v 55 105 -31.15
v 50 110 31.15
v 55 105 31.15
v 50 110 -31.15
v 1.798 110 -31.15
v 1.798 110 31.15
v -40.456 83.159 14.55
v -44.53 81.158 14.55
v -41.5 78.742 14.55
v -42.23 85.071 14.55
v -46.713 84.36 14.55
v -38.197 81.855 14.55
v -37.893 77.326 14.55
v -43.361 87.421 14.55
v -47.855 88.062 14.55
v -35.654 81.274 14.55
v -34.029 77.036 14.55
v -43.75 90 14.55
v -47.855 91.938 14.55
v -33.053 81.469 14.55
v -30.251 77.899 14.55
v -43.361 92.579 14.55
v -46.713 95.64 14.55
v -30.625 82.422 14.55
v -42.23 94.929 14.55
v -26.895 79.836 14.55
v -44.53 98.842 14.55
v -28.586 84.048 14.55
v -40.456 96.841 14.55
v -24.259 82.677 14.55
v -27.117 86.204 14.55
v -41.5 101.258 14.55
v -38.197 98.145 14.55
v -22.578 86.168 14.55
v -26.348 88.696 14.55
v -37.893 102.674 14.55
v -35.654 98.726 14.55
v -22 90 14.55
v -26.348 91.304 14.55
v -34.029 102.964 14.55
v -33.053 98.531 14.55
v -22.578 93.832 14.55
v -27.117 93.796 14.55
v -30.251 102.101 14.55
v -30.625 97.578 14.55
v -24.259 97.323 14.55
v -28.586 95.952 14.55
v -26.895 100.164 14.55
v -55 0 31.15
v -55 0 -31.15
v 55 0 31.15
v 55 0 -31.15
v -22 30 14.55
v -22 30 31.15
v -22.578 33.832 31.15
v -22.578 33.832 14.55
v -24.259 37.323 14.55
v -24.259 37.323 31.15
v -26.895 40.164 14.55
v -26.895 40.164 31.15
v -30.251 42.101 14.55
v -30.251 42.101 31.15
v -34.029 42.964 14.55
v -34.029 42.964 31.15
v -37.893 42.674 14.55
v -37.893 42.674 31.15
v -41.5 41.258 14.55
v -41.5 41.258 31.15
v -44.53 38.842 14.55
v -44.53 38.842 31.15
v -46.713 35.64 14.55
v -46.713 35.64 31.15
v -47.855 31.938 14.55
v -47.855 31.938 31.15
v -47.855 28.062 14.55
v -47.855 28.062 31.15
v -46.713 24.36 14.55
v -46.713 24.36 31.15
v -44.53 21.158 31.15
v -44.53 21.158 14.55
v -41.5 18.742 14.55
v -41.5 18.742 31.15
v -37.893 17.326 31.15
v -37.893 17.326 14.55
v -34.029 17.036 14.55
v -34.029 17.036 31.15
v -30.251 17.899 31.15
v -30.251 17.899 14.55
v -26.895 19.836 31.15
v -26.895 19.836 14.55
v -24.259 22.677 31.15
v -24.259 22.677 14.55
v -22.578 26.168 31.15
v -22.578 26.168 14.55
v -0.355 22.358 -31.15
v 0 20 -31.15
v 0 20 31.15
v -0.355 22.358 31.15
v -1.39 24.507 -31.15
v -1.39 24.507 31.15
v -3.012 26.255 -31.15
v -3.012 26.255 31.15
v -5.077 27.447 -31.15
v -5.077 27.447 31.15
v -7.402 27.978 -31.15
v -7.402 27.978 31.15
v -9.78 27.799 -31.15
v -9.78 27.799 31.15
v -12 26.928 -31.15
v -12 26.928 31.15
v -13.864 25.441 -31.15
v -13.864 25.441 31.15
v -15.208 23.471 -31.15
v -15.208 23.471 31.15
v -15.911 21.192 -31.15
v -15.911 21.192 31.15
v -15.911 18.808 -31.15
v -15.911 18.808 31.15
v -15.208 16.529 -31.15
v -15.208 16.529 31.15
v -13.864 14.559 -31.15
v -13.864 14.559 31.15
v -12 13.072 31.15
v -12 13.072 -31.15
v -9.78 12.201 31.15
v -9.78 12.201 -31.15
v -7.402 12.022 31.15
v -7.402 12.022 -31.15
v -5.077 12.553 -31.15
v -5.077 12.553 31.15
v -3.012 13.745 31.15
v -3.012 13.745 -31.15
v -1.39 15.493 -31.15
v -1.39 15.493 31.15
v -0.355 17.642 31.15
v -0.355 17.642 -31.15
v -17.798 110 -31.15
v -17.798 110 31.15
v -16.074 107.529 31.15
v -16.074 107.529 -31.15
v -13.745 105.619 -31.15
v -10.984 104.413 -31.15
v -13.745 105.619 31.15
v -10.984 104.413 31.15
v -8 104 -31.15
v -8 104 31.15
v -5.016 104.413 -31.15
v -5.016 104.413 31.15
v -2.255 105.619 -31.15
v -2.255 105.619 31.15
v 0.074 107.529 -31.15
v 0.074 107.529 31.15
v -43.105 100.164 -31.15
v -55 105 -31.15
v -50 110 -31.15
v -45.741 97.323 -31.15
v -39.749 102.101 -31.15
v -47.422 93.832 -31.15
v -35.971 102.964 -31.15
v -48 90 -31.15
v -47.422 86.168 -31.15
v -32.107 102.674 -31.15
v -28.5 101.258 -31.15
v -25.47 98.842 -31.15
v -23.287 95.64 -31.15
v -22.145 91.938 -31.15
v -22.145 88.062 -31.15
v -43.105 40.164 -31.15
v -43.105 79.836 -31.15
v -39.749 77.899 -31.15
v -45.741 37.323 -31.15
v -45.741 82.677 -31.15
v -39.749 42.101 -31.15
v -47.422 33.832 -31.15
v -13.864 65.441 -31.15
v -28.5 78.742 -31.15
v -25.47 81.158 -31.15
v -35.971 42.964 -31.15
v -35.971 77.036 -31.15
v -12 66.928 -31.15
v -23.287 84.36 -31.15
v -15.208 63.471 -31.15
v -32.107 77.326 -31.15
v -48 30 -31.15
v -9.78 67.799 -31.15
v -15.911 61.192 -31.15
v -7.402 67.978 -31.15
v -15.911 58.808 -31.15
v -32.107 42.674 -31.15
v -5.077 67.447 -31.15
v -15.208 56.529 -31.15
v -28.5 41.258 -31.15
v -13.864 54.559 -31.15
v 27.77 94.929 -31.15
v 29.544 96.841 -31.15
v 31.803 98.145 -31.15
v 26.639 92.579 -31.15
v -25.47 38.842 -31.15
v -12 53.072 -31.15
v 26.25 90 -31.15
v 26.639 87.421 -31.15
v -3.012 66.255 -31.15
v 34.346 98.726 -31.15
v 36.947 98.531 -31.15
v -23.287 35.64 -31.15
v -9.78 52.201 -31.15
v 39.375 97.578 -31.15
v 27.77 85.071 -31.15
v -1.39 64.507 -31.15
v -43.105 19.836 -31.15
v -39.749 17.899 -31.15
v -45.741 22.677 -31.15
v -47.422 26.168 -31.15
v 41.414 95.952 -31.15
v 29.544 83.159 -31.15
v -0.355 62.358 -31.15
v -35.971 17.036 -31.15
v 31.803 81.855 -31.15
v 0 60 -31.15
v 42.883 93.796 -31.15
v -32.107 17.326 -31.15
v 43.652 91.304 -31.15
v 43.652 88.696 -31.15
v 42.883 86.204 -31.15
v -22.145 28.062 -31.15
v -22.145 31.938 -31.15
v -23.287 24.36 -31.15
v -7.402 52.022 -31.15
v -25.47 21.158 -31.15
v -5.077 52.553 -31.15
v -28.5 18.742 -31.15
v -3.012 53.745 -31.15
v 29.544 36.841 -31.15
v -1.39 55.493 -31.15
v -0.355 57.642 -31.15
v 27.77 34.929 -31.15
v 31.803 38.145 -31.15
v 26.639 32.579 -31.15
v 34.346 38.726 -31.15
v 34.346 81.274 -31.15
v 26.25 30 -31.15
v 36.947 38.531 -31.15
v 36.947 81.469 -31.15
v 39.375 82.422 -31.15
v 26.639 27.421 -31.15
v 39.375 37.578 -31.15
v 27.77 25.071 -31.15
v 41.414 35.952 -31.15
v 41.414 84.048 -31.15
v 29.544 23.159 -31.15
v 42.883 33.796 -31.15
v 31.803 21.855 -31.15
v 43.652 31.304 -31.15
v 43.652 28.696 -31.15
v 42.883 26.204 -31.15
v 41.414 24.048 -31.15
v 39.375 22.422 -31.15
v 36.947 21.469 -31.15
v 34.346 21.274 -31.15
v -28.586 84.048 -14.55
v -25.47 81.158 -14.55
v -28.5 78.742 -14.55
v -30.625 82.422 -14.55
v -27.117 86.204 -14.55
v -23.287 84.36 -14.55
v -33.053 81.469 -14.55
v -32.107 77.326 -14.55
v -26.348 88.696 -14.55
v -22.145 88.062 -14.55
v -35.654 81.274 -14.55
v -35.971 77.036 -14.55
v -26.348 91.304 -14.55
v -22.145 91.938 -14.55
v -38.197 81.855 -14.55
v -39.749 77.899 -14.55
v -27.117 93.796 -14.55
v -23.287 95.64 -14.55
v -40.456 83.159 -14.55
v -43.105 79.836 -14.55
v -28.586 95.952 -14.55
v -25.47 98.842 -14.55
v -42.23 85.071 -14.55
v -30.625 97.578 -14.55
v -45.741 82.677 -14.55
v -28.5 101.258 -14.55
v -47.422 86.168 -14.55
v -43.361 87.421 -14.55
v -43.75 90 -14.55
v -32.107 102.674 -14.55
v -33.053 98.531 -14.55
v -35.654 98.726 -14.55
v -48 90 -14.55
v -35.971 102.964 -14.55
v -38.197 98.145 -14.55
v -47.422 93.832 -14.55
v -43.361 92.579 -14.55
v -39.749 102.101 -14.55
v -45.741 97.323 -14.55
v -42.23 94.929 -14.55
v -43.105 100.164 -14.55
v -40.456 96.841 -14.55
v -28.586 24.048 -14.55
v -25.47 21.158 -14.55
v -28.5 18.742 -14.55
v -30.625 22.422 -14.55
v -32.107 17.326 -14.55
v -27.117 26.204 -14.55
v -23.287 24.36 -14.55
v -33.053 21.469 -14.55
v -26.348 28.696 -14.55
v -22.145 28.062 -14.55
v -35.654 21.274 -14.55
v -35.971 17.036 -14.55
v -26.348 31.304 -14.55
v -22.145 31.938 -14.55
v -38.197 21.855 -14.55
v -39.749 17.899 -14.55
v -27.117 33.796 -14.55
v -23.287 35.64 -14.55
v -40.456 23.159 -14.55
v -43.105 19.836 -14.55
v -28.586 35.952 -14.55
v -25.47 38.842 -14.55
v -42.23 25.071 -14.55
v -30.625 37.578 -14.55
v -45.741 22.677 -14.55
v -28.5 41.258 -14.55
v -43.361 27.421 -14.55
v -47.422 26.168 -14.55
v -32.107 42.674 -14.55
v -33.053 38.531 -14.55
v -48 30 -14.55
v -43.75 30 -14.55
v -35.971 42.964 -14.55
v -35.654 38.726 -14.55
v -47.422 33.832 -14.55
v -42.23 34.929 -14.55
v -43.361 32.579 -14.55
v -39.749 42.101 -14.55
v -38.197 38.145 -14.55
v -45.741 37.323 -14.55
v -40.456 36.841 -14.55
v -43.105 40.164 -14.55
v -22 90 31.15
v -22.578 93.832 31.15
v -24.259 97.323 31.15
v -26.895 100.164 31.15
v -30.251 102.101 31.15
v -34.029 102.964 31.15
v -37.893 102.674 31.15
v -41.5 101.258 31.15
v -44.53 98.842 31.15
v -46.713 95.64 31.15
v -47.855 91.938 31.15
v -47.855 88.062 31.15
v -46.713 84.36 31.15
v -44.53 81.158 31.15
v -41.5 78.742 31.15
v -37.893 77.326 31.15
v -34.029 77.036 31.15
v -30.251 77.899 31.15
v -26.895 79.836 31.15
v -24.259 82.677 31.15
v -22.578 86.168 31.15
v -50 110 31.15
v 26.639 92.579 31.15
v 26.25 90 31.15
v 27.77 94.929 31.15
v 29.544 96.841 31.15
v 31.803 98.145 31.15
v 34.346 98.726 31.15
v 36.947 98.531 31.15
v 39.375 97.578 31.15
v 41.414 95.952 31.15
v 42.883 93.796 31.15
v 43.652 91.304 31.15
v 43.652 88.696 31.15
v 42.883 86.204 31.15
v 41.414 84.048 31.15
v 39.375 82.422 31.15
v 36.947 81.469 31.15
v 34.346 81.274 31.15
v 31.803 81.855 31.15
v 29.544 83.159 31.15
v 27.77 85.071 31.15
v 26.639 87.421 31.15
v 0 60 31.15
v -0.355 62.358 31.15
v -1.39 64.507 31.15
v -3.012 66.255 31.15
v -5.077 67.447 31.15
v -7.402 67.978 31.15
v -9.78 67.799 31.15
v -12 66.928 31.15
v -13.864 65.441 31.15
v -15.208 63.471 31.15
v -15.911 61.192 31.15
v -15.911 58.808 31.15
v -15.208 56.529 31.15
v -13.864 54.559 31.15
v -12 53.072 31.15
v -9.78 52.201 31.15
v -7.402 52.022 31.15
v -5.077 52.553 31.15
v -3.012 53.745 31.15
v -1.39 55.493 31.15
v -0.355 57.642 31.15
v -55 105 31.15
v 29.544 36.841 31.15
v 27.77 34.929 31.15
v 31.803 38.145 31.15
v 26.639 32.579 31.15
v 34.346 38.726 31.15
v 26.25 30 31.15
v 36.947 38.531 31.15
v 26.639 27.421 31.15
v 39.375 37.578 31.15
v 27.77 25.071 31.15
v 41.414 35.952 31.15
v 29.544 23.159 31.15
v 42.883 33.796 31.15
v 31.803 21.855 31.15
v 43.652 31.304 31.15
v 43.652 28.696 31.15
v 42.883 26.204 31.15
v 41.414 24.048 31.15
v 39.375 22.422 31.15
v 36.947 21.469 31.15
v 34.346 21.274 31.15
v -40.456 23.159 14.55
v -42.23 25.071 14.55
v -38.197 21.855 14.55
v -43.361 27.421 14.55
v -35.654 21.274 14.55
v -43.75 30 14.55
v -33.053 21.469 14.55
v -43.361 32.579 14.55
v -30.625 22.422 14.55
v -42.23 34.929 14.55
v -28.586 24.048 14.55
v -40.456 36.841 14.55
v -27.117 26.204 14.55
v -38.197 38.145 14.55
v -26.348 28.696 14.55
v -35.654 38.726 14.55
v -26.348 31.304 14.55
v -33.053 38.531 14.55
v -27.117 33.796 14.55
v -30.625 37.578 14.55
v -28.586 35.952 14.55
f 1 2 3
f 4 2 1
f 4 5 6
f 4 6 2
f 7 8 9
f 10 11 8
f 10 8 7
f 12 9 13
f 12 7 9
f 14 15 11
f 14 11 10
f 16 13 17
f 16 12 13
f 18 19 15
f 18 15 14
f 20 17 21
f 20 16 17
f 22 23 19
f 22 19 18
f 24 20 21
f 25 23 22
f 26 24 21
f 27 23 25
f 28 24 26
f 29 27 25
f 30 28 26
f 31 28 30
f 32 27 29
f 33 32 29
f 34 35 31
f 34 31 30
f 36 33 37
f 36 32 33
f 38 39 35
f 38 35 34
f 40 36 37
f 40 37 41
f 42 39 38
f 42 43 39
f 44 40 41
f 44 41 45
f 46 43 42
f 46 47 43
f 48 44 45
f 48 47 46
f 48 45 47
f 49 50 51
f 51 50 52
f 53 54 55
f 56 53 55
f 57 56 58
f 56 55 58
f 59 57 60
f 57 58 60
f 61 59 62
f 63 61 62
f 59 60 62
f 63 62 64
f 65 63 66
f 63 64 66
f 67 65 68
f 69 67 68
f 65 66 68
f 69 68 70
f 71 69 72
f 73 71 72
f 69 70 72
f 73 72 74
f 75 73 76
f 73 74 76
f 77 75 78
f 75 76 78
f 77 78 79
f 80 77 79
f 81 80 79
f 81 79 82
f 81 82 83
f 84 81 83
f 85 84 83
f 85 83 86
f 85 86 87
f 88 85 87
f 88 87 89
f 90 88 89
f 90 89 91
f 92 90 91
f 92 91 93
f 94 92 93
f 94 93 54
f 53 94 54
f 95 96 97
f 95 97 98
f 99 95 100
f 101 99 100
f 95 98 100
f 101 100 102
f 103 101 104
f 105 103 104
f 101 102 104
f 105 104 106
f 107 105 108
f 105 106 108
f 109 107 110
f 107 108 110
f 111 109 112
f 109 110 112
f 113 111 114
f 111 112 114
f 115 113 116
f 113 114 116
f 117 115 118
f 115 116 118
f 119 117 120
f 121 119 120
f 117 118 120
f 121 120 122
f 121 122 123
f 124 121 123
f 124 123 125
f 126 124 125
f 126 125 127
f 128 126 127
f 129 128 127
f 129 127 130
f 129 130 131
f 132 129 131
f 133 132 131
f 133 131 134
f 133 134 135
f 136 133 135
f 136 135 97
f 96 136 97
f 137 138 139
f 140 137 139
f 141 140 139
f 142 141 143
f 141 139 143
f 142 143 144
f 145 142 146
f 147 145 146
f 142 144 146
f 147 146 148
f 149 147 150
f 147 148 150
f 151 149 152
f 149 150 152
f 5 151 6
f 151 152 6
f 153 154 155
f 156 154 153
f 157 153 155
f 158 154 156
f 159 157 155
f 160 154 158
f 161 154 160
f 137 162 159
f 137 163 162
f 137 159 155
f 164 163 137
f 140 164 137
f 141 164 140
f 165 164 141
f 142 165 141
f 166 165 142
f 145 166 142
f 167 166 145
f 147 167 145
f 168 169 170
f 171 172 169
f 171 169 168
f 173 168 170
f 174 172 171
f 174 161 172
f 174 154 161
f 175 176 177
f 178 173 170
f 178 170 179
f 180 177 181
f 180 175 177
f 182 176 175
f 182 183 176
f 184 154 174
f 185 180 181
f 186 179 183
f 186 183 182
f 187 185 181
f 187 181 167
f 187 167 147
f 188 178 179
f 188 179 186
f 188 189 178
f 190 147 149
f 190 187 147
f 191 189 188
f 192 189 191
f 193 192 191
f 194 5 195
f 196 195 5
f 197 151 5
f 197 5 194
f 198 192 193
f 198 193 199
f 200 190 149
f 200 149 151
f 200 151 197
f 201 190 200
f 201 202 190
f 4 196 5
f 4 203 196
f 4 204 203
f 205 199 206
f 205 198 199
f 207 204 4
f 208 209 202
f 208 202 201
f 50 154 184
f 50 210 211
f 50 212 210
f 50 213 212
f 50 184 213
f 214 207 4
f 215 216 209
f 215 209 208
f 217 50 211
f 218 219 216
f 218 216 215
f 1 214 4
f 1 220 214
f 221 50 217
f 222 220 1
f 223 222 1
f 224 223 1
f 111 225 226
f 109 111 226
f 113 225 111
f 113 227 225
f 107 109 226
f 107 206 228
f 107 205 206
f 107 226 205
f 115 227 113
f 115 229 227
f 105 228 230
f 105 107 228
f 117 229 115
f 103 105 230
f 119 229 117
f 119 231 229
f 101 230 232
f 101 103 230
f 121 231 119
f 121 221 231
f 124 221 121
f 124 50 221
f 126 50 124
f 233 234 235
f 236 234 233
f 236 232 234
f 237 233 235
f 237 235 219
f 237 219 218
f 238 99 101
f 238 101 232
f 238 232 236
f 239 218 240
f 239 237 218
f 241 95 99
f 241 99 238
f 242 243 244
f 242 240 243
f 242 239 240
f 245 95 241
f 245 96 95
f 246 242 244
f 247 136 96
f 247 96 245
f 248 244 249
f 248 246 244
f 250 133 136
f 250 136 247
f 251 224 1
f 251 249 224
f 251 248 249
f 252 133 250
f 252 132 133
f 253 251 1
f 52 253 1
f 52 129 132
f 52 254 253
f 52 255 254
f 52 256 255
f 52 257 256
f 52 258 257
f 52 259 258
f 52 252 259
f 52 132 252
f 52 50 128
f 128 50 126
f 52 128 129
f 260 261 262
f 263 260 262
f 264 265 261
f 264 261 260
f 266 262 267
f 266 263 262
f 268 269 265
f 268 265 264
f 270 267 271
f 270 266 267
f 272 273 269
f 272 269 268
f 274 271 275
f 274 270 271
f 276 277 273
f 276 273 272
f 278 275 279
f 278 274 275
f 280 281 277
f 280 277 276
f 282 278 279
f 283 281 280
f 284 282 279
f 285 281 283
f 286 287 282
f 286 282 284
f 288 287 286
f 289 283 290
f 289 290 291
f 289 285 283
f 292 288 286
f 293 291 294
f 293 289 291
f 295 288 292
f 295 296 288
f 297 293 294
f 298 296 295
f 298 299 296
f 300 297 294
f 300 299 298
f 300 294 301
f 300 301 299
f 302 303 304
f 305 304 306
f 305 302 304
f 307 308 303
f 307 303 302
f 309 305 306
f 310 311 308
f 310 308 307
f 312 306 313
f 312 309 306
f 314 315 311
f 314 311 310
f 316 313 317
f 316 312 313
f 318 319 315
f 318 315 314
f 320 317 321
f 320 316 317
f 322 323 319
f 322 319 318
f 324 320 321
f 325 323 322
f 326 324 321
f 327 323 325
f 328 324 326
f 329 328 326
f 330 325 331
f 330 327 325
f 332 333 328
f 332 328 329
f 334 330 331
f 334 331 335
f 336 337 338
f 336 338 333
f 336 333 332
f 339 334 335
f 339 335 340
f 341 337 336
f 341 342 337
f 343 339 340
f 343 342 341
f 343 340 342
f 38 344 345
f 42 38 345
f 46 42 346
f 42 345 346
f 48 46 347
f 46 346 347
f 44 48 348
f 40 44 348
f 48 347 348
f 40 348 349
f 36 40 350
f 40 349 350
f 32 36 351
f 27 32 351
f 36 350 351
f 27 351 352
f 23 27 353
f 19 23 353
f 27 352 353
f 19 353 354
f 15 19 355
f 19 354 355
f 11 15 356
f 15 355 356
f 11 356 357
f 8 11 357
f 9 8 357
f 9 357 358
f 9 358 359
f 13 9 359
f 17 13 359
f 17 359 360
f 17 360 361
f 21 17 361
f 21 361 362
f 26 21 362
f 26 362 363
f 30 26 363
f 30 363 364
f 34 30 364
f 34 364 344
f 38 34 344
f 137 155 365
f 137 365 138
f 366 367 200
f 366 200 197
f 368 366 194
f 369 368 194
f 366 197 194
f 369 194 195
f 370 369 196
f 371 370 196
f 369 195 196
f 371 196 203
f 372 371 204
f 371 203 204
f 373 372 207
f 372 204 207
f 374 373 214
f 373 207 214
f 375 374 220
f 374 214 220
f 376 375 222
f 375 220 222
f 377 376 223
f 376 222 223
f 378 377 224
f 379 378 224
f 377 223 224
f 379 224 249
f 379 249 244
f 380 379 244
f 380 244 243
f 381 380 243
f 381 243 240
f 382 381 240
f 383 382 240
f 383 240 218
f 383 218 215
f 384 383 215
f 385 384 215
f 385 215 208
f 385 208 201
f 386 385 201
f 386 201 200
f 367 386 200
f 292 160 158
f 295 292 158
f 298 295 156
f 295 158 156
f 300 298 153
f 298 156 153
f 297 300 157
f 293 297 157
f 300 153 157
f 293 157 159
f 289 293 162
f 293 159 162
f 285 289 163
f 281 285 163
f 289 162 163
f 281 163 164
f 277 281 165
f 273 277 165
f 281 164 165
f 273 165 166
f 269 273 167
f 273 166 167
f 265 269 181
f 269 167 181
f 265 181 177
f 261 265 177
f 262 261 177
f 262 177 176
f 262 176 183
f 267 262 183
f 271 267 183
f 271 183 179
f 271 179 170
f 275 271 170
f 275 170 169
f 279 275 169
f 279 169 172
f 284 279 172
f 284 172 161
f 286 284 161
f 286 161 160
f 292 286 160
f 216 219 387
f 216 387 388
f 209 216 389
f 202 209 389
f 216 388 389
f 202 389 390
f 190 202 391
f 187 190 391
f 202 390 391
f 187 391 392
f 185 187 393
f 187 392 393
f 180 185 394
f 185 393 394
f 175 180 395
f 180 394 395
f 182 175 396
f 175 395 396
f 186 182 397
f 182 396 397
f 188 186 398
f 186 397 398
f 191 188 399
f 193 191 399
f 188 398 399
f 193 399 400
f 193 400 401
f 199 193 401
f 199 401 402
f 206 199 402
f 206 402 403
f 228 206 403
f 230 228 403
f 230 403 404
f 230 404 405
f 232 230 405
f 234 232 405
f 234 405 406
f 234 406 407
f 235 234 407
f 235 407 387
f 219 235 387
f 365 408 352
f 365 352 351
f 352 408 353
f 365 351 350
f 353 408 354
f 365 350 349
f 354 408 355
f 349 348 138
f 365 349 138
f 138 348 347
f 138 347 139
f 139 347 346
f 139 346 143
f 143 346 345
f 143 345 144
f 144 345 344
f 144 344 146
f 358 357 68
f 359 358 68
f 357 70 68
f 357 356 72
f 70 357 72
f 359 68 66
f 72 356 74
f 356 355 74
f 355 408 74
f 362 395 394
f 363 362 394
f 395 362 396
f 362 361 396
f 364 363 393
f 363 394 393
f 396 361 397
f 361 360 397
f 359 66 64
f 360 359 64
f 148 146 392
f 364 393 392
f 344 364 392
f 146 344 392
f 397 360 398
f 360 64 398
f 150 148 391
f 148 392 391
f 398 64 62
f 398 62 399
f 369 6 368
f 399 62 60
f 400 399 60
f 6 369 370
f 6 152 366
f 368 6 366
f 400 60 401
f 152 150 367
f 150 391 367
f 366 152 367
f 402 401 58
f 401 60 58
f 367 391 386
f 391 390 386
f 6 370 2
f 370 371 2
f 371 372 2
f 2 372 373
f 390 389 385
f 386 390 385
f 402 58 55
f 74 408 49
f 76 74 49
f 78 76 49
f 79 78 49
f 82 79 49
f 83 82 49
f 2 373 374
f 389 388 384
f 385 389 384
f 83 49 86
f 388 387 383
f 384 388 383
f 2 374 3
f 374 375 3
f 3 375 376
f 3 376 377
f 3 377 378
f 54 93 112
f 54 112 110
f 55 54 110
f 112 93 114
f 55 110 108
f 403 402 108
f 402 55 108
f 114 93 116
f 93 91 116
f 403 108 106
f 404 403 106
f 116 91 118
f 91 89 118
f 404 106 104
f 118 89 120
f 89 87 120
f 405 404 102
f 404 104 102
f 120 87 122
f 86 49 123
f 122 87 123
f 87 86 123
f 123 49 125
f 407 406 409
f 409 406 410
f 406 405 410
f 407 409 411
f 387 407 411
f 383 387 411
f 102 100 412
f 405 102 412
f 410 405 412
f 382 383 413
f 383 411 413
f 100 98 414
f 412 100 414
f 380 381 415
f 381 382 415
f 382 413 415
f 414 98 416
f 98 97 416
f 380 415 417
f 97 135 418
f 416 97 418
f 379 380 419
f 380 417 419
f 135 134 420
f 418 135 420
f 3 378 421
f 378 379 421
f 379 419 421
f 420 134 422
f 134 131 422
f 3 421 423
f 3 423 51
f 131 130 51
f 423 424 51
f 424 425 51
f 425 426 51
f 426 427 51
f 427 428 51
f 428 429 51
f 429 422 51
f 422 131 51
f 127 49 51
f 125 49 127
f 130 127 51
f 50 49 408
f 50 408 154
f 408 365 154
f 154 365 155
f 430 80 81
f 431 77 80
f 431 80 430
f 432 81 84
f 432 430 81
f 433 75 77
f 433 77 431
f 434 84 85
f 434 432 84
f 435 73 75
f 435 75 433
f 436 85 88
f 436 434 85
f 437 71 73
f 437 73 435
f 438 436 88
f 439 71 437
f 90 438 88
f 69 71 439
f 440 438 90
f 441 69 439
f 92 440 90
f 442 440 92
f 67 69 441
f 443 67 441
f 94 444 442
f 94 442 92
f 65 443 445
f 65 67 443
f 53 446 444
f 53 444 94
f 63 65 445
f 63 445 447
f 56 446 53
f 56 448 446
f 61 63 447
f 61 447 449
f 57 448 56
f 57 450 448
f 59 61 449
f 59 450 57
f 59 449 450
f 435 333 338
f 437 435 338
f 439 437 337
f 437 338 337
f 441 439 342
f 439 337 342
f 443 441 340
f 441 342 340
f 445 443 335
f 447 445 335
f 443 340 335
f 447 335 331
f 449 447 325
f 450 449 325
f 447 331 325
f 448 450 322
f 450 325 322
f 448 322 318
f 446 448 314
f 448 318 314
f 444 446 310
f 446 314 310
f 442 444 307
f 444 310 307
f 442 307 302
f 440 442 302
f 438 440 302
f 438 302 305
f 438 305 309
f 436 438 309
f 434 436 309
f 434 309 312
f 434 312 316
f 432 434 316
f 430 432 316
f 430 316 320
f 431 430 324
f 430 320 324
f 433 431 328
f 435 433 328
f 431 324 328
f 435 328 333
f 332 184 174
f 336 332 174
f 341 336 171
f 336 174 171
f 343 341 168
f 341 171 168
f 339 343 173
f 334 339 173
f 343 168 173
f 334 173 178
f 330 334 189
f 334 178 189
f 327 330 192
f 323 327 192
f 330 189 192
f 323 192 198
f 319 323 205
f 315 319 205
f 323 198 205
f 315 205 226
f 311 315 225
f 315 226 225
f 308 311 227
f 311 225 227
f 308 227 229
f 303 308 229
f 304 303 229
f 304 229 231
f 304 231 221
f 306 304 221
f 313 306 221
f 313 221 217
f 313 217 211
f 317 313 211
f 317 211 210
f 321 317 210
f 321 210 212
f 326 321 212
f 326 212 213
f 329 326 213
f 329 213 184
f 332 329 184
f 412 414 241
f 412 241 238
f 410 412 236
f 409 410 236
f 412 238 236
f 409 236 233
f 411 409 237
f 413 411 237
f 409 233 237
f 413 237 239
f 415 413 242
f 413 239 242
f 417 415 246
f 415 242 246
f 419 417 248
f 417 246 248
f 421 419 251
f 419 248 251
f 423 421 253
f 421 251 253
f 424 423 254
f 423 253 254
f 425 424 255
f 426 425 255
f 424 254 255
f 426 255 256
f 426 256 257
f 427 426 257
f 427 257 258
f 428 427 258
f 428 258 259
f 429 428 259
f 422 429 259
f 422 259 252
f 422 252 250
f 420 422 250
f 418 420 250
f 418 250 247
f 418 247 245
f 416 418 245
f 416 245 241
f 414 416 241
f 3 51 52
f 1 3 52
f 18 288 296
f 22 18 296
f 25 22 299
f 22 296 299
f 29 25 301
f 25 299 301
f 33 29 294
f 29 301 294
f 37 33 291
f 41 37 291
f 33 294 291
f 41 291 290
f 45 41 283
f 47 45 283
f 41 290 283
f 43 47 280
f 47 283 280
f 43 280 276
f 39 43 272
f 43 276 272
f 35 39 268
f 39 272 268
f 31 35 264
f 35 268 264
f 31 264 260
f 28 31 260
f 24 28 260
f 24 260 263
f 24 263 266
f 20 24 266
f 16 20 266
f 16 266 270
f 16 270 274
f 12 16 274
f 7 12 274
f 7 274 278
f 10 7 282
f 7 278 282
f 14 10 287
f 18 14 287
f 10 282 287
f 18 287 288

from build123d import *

# Parameters (mm, degrees)
SKIZZE1_W                                            = 110
SKIZZE1_H                                            = 62.3
AUFSATZ_LINEAR_AUSTRAGEN1_DEPTH                      = 110
DURCHGANGSLOCH_F_R_M161_D                            = 17.5
STIRNSENKUNG_F_R_M16_ZYLINDERSCHRAUBE_MI_D           = 17.5
STIRNSENKUNG_F_R_M16_ZYLINDERSCHRAUBE_MI_CBORE_D     = 26
STIRNSENKUNG_F_R_M16_ZYLINDERSCHRAUBE_MI_CBORE_DEPTH = 16.6
F_16_0_H7_16_DURCHMESSER_BOHRUNG2_D                  = 16
F_22_0_22_DURCHMESSER_BOHRUNG1_D                     = 22
FASE1_SIZE                                           = 5
STIRNSENKUNG_F_R_M16_ZYLINDERSCHRAUB_2_D             = 17.5
STIRNSENKUNG_F_R_M16_ZYLINDERSCHRAUB_2_CBORE_D       = 26
STIRNSENKUNG_F_R_M16_ZYLINDERSCHRAUB_2_CBORE_DEPTH   = 16.6


with BuildPart() as part:
    # Skizze1 → Aufsatz-Linear austragen1 (new body)
    with BuildSketch(Plane(origin=(0, 0, 0), x_dir=(1, 0, 0), z_dir=(0, 1, 0))):
        Rectangle(SKIZZE1_W, SKIZZE1_H)
    extrude(amount=AUFSATZ_LINEAR_AUSTRAGEN1_DEPTH)

    # Durchgangsloch für M161 (through all)
    with Locations(Plane.XY.offset(31.15)):
        with Locations((35, 90), (35, 30)):
            Hole(DURCHGANGSLOCH_F_R_M161_D / 2)

    # Stirnsenkung f_r M16 Zylinderschraube mi (through all)
    with Locations(Plane.XY.offset(31.15)):
        with Locations((-35, 90), (-35, 30)):
            CounterBoreHole(STIRNSENKUNG_F_R_M16_ZYLINDERSCHRAUBE_MI_D / 2, STIRNSENKUNG_F_R_M16_ZYLINDERSCHRAUBE_MI_CBORE_D / 2, STIRNSENKUNG_F_R_M16_ZYLINDERSCHRAUBE_MI_CBORE_DEPTH)

    # Ø16.0 H7 (16) Durchmesser Bohrung2 (through all)
    with Locations(Plane(origin=(0, 0, -31.15), x_dir=(-1, 0, 0), z_dir=(0, 0, -1))):
        with Locations((8, 60), (8, 20)):
            Hole(F_16_0_H7_16_DURCHMESSER_BOHRUNG2_D / 2)

    # Ø22.0 (22) Durchmesser Bohrung1 (through all)
    with Locations(Plane(origin=(0, 0, -31.15), x_dir=(-1, 0, 0), z_dir=(0, 0, -1))):
        with Locations((8, 115)):
            Hole(F_22_0_22_DURCHMESSER_BOHRUNG1_D / 2)

    # Fase1
    fase1_edges = [part.edges().sort_by_distance(p)[0] for p in [
        (-55, 110, 0),
        (55, 110, 0),
    ]]
    chamfer(fase1_edges, length=FASE1_SIZE)

    # Stirnsenkung f_r M16 Zylinderschraub 2 (through all)
    with Locations(Plane(origin=(0, 0, -31.15), x_dir=(-1, 0, 0), z_dir=(0, 0, -1))):
        with Locations((35, 90), (35, 30)):
            CounterBoreHole(STIRNSENKUNG_F_R_M16_ZYLINDERSCHRAUB_2_D / 2, STIRNSENKUNG_F_R_M16_ZYLINDERSCHRAUB_2_CBORE_D / 2, STIRNSENKUNG_F_R_M16_ZYLINDERSCHRAUB_2_CBORE_DEPTH)


solid = part.part
